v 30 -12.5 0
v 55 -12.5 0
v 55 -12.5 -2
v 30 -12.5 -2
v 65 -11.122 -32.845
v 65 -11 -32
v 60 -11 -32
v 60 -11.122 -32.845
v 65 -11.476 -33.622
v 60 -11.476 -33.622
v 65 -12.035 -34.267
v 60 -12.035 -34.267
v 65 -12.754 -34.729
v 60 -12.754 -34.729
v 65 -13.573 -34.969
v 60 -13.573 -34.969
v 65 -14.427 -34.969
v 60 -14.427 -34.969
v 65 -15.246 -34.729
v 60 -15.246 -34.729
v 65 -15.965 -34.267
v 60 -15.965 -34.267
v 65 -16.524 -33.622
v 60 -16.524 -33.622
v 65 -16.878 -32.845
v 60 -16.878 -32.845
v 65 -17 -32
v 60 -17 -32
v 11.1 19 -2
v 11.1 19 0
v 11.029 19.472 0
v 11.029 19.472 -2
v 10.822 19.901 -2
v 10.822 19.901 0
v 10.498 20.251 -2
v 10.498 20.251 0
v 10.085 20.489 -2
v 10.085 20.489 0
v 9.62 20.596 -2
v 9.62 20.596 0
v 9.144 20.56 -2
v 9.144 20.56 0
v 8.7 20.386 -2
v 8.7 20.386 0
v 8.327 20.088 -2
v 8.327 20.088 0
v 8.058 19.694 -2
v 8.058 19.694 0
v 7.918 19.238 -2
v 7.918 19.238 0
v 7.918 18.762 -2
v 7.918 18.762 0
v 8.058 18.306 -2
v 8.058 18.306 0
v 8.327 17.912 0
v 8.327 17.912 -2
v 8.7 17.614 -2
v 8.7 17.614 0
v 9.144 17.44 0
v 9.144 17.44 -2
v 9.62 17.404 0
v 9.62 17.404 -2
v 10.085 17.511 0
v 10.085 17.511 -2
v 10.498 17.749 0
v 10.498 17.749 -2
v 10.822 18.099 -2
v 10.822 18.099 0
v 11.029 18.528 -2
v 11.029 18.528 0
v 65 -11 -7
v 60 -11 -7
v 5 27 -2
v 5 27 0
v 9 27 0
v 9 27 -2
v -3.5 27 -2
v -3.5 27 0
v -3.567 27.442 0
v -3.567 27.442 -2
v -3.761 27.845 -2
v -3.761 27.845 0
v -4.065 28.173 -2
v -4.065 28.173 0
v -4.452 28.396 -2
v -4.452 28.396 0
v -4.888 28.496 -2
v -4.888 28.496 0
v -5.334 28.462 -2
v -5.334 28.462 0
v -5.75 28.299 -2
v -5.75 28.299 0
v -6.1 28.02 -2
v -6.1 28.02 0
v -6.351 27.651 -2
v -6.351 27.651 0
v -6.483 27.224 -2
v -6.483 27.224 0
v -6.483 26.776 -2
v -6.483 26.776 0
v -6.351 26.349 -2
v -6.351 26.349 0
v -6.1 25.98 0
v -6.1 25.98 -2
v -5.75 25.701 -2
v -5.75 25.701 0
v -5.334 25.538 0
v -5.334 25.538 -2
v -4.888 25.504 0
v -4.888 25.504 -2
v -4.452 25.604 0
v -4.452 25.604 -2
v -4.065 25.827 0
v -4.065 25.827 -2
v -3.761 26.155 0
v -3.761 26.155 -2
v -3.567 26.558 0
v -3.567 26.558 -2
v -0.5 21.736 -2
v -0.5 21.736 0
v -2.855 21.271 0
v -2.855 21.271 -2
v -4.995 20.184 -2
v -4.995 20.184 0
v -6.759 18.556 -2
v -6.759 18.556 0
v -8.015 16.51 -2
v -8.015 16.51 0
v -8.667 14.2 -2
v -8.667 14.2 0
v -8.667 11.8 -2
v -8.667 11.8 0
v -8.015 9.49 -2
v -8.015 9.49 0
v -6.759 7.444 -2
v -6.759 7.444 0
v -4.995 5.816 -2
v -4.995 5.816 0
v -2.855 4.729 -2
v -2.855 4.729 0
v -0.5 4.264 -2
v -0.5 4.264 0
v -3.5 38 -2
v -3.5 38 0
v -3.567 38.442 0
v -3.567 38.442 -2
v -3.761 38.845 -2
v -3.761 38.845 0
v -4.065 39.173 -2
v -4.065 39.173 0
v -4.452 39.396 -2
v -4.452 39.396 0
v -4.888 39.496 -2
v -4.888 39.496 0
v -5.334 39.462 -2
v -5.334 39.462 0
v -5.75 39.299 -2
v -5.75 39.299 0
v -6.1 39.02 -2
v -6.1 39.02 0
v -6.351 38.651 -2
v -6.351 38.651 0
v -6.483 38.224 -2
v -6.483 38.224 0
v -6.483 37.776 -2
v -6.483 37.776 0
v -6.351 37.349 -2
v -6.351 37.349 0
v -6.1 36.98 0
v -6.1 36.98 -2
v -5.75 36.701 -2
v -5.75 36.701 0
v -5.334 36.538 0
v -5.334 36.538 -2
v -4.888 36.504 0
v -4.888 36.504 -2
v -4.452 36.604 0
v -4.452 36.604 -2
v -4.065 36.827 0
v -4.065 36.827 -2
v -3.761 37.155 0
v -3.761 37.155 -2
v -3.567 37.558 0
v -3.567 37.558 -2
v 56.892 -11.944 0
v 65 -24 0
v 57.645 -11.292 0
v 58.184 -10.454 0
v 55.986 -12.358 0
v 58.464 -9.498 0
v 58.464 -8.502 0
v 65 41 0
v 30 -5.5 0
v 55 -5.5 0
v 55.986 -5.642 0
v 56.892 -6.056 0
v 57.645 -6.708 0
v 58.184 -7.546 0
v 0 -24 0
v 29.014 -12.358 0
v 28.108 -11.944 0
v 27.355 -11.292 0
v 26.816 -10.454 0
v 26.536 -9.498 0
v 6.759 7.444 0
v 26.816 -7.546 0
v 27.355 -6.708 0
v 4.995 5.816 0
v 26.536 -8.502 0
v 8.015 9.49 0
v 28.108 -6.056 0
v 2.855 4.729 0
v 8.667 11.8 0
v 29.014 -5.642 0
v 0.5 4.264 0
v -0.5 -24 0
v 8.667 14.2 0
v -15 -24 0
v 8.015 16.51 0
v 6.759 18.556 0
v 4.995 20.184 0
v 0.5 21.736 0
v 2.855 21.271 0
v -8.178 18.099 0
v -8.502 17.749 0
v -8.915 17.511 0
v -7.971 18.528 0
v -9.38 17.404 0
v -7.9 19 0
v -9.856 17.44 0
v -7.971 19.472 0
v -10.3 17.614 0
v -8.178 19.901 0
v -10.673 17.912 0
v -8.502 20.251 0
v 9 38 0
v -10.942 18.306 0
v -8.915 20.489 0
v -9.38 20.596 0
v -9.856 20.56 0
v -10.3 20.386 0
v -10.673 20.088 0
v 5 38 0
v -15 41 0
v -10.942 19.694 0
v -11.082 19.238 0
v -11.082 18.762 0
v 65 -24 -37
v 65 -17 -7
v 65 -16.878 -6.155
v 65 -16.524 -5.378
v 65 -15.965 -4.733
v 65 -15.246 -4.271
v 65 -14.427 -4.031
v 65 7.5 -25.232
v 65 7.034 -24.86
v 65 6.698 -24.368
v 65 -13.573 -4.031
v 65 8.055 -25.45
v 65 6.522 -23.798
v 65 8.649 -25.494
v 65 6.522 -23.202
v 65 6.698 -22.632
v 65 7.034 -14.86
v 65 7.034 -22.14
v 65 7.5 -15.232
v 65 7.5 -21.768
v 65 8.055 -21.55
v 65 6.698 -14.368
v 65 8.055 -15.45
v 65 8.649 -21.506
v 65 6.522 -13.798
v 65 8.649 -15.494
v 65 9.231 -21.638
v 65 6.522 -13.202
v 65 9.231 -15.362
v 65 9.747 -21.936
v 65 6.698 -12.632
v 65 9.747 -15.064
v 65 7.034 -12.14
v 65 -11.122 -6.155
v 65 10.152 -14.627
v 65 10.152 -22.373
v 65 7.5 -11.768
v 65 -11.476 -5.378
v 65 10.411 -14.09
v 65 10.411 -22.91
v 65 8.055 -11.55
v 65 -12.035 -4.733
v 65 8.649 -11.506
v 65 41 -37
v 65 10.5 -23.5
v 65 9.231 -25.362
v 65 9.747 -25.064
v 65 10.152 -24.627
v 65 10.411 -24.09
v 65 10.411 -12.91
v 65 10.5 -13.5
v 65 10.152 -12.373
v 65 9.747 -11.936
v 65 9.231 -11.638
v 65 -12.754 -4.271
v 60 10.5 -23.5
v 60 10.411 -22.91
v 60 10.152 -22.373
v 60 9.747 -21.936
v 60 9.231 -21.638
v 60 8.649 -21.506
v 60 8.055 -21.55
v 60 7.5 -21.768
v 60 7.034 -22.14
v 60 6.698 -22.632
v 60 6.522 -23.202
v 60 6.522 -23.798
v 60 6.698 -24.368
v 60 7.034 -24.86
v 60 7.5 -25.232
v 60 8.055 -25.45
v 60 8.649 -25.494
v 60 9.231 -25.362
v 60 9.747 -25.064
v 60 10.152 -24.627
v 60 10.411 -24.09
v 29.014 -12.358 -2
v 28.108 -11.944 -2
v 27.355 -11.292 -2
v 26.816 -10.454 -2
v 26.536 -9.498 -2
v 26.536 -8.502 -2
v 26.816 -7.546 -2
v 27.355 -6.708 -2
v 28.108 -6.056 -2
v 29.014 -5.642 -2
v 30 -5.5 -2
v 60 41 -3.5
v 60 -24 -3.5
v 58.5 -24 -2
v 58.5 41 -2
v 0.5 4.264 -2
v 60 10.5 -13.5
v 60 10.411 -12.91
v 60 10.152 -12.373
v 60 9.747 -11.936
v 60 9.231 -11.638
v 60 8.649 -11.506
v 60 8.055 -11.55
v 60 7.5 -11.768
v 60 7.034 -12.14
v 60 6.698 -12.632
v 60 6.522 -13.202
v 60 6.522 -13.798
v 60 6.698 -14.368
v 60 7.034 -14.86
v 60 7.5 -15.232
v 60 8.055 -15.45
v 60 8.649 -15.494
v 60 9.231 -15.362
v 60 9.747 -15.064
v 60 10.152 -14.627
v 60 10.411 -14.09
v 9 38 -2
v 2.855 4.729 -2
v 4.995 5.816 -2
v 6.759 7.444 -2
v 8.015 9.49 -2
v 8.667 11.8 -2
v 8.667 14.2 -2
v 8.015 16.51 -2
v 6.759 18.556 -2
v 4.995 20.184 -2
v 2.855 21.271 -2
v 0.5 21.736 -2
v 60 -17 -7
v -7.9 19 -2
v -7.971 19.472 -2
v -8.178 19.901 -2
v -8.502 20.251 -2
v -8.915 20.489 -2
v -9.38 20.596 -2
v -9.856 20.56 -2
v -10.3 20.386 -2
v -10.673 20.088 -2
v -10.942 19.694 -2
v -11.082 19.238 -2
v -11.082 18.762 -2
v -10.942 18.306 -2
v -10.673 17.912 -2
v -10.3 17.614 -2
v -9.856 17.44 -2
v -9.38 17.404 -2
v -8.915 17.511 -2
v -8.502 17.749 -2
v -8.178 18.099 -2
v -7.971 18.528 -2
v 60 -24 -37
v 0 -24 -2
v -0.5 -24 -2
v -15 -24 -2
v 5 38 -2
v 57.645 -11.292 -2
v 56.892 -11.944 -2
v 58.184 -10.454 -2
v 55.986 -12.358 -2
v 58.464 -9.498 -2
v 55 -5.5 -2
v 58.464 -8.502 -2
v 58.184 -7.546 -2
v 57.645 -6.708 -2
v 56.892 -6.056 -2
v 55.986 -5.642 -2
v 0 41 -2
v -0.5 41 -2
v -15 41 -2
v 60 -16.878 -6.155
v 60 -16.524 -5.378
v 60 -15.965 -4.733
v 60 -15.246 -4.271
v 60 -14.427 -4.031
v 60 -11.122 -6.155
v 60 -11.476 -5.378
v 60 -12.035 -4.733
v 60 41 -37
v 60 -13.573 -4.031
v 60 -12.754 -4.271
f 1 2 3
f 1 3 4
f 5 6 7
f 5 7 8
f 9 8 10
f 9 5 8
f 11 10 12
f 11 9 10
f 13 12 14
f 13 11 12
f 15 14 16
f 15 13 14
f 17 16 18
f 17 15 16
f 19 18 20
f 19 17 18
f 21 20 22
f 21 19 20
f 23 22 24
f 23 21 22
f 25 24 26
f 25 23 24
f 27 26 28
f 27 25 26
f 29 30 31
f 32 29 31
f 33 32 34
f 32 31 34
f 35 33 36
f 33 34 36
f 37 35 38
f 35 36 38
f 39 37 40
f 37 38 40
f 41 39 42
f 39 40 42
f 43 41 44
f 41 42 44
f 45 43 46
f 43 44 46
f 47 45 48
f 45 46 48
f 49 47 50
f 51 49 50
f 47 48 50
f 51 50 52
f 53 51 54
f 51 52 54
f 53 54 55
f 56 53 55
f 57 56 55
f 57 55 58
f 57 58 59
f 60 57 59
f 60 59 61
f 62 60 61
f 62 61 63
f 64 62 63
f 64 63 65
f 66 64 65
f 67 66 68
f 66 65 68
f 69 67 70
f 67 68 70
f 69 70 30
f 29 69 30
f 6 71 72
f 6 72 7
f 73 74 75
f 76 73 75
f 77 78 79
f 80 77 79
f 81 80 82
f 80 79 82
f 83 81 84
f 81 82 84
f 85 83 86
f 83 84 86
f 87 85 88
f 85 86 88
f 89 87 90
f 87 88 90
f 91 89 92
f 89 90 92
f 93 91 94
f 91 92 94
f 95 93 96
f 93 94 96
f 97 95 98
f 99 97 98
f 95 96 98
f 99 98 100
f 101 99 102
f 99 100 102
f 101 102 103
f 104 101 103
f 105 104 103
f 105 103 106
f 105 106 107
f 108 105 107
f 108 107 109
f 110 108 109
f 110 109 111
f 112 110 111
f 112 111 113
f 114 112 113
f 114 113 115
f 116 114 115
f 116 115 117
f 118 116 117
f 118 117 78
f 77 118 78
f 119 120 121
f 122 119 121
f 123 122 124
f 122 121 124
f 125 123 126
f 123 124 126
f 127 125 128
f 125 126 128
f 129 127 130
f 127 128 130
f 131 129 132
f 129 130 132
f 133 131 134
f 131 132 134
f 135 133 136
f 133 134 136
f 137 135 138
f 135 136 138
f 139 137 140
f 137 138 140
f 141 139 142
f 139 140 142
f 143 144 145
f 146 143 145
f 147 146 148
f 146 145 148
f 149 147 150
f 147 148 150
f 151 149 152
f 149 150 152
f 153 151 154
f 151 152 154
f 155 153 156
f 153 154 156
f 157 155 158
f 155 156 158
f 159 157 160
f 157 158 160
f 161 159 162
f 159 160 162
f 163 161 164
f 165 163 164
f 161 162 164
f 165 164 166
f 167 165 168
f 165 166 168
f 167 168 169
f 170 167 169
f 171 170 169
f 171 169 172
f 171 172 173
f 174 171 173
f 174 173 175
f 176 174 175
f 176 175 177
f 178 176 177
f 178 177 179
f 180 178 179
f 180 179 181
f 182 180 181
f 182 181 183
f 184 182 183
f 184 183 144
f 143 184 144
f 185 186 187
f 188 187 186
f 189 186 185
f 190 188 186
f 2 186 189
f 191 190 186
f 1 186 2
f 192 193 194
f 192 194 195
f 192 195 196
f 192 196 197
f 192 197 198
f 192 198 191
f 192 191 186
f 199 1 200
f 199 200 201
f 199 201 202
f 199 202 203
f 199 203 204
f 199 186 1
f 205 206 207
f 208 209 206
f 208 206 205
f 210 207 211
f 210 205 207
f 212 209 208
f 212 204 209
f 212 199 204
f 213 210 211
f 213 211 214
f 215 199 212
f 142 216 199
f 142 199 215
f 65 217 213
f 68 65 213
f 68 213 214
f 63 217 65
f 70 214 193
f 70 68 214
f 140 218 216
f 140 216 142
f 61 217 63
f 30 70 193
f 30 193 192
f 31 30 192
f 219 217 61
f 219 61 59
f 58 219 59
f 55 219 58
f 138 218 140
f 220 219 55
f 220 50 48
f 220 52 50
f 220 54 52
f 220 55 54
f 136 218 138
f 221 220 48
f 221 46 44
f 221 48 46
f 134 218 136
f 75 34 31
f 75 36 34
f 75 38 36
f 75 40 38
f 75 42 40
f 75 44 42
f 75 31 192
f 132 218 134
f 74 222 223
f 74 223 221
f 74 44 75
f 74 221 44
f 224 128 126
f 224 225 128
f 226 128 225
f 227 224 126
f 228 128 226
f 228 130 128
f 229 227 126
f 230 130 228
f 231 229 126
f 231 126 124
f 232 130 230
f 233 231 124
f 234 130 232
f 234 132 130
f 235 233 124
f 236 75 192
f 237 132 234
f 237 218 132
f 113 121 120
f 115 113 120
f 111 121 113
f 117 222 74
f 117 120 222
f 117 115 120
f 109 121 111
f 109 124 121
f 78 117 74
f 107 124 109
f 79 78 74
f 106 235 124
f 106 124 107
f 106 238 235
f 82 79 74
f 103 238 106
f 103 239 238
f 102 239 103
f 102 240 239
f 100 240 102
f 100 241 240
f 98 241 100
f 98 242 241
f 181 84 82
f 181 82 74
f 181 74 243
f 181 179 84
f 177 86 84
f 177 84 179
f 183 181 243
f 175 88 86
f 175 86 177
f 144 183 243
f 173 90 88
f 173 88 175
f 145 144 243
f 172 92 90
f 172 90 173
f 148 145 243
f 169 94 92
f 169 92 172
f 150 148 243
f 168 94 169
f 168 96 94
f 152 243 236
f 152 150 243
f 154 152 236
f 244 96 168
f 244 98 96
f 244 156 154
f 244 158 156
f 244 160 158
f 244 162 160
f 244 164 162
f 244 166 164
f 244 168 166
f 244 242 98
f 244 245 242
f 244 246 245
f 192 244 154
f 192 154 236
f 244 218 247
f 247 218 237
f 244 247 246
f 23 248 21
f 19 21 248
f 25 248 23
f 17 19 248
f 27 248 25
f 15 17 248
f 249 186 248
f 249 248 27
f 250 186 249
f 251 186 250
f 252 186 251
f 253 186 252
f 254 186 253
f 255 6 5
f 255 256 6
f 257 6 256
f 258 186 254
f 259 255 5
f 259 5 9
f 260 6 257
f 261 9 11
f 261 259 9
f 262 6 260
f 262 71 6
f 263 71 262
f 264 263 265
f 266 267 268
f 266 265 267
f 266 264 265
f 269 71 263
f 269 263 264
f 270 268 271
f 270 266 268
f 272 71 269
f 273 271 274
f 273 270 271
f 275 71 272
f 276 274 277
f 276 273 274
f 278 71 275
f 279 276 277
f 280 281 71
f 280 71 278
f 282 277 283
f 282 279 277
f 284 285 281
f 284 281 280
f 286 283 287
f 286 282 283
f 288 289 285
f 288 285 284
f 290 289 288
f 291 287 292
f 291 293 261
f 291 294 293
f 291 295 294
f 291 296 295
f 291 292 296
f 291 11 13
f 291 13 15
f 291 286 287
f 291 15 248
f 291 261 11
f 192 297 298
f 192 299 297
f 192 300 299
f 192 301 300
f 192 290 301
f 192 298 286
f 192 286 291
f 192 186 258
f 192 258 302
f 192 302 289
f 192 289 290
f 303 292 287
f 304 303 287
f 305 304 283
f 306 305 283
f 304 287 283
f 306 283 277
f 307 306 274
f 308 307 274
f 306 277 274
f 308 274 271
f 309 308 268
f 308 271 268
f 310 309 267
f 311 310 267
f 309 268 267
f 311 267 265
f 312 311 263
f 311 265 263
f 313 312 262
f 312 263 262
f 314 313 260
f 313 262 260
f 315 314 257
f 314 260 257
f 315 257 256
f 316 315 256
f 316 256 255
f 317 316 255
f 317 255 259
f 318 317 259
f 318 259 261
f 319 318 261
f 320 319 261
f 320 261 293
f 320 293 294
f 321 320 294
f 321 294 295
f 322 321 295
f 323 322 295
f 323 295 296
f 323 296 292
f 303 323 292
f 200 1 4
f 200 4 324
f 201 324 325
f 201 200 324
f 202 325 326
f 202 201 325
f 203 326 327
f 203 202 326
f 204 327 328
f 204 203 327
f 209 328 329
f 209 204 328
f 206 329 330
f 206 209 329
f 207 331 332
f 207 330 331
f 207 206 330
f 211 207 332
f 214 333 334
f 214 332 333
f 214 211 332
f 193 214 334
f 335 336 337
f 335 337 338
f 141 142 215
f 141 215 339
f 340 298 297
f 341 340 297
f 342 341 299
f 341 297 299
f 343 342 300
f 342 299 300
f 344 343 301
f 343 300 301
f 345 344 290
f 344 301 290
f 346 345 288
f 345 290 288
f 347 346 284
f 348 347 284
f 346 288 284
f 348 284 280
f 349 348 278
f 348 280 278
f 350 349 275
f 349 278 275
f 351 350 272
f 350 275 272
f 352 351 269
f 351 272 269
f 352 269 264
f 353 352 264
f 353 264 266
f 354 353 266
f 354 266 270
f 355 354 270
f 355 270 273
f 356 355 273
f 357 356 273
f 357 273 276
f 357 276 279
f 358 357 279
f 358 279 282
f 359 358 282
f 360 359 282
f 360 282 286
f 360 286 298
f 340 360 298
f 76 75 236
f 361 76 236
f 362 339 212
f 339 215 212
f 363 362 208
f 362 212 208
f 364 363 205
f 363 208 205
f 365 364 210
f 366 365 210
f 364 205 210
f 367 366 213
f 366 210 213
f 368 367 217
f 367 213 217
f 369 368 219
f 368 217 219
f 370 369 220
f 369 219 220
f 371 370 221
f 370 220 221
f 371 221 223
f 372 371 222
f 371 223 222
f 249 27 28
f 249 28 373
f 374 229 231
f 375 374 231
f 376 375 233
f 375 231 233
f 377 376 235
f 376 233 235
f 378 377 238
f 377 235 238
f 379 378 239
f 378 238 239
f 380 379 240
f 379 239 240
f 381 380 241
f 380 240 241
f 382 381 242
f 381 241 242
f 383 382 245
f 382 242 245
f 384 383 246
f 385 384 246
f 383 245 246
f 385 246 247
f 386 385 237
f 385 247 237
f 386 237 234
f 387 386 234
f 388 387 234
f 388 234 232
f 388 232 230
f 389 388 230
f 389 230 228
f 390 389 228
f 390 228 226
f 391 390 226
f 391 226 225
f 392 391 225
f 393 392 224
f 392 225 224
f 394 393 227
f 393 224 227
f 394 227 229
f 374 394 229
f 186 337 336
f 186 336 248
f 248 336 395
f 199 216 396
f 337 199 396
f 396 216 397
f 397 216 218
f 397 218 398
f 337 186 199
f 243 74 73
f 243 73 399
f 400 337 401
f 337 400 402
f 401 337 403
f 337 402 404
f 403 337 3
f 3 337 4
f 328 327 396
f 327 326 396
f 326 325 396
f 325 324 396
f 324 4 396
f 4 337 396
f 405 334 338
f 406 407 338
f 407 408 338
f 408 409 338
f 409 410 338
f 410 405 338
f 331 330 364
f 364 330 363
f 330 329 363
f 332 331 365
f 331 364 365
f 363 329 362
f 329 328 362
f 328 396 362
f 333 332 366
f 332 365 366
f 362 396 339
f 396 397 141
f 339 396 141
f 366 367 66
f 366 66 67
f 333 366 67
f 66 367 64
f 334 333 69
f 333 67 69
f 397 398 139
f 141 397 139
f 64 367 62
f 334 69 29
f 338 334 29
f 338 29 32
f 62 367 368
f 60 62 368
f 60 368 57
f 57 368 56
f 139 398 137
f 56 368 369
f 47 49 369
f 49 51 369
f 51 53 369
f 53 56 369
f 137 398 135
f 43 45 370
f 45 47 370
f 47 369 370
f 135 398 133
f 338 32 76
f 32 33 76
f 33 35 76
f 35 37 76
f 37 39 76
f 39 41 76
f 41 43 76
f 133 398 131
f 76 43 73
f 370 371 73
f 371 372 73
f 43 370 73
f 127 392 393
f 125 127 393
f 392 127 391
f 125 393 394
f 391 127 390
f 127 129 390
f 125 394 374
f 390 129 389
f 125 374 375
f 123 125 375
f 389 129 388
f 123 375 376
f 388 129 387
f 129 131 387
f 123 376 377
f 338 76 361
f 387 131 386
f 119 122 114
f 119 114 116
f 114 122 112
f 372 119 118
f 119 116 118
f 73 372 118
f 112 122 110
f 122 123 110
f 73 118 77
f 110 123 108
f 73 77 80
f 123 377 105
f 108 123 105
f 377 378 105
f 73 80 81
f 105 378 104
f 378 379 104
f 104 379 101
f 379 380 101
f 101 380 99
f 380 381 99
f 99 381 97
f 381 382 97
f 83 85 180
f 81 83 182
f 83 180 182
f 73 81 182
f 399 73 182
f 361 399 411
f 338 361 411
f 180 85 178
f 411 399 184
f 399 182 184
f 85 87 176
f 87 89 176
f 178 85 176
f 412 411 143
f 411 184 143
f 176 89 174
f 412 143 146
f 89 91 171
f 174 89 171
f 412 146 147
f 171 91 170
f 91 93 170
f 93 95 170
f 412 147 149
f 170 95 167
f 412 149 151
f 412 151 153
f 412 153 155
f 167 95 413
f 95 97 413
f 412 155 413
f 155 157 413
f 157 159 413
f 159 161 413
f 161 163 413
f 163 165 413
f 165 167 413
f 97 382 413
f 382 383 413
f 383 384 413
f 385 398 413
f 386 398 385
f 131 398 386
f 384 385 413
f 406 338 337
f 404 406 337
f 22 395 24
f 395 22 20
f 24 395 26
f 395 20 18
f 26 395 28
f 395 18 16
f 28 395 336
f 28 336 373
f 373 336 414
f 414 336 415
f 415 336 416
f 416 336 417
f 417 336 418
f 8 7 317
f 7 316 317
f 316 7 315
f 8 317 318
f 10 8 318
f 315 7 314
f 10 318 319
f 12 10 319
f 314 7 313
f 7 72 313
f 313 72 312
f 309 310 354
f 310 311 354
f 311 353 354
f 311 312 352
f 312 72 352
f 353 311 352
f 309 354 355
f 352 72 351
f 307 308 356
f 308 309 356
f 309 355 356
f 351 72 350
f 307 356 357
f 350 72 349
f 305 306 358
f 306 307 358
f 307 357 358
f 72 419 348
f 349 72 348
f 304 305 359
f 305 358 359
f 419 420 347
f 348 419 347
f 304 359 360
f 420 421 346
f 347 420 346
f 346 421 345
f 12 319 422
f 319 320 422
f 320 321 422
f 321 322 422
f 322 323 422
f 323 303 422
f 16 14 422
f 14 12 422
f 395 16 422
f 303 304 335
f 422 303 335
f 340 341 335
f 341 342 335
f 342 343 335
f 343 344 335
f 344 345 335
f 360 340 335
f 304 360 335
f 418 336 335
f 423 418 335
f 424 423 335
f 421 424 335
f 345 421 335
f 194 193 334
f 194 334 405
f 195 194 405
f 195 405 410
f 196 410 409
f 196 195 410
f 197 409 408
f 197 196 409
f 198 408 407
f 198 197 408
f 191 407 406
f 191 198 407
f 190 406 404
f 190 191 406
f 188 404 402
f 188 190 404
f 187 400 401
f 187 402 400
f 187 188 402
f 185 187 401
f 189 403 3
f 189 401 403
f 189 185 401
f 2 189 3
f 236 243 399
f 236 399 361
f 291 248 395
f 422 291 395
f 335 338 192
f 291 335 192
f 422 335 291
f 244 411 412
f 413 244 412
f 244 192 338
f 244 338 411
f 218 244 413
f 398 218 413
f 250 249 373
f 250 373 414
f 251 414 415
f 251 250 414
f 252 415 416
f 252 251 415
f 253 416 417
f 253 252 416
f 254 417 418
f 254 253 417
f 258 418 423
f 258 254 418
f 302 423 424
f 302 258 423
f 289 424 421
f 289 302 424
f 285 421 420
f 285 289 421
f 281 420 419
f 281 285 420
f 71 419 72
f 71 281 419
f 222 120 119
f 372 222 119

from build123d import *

# Parameters (mm, degrees)
SKETCH_1_W           = 30
SKETCH_1_H           = 48
EXTRUDE_1_DEPTH      = 2
SKETCH_2_R           = 1.6
CUT_EXTRUDE_1_DEPTH  = 2
SKETCH_3_R           = 8.75
CUT_EXTRUDE_2_DEPTH  = 2
SKETCH_4_W           = 30
SKETCH_4_H           = 2
EXTRUDE_2_DEPTH      = 17
SKETCH_14_W          = 0.5
SKETCH_14_H          = 2
CUT_EXTRUDE_6_DEPTH  = 67.738294854
SKETCH_15_W          = 2
SKETCH_15_H          = 65
EXTRUDE_7_DEPTH      = 50
SKETCH_16_W          = 5
SKETCH_16_H          = 65
EXTRUDE_8_DEPTH      = 35
SKETCH_17_R          = 2
CUT_EXTRUDE_7_DEPTH  = 35
SKETCH_18_W          = 2
SKETCH_18_H          = 28.264297395
EXTRUDE_9_DEPTH      = 1
EXTRUDE_10_REACH     = 87.675
SKETCH_19_W          = 2
SKETCH_19_H          = 19.264297395
CUT_EXTRUDE_8_DEPTH  = 6
CUT_EXTRUDE_9_DEPTH  = 6
CHAMFER_1_SIZE       = 1.5
SKETCH_22_R          = 1.5
SKETCH_22_W          = 4
SKETCH_22_H          = 11
CUT_EXTRUDE_10_DEPTH = 86.293610546


with BuildPart() as part:
    # 草图1 → 凸台-拉伸1 (new body)
    with BuildSketch(Plane.XY):
        Rectangle(SKETCH_1_W, SKETCH_1_H)
    extrude(amount=-EXTRUDE_1_DEPTH)

    # 草图2 → 切除-拉伸1 (cut)
    with BuildSketch(Plane.XY):
        with Locations((-9.5, 19)):
            Circle(SKETCH_2_R)
        with Locations((9.5, 19)):
            Circle(SKETCH_2_R)
    extrude(amount=-CUT_EXTRUDE_1_DEPTH, mode=Mode.SUBTRACT)

    # 草图3 → 切除-拉伸2 (cut)
    with BuildSketch(Plane.XY):
        with Locations((0, 13)):
            Circle(SKETCH_3_R)
    extrude(amount=-CUT_EXTRUDE_2_DEPTH, mode=Mode.SUBTRACT)

    # 草图4 → 凸台-拉伸2 (add)
    with BuildSketch(Plane(origin=(0, 24, 0), x_dir=(1, 0, 0), z_dir=(0, 1, 0))):
        with Locations((0, 1)):
            Rectangle(SKETCH_4_W, SKETCH_4_H)
    extrude(amount=EXTRUDE_2_DEPTH)

    # 草图14 → 切除-拉伸6 (cut, through all)
    with BuildSketch(Plane.XZ.offset(24)):
        with Locations((-0.25, -1)):
            Rectangle(SKETCH_14_W, SKETCH_14_H)
    extrude(amount=-CUT_EXTRUDE_6_DEPTH, mode=Mode.SUBTRACT)


with BuildPart() as cut_extrude_6_piece_1:
    # of the separate pieces the step leaves, piece 1, a body of its own (cut_extrude_6_pieces)
    add(part.part.solids().sort_by_distance((15, -24, 0))[0])

    # 草图15 → 凸台-拉伸7 (add)
    with BuildSketch(Plane(origin=(15, 0, 0), x_dir=(0, 0, -1), z_dir=(1, 0, 0))):
        with Locations((1, 8.5)):
            Rectangle(SKETCH_15_W, SKETCH_15_H)
    extrude(amount=EXTRUDE_7_DEPTH)

    # 草图16 → 凸台-拉伸8 (add)
    with BuildSketch(Plane(origin=(0, 0, -2), x_dir=(-1, 0, 0), z_dir=(0, 0, -1))):
        with Locations((-62.5, 8.5)):
            Rectangle(SKETCH_16_W, SKETCH_16_H)
    extrude(amount=EXTRUDE_8_DEPTH)

    # 草图17 → 切除-拉伸7 (cut)
    with BuildSketch(Plane(origin=(65, 0, 0), x_dir=(0, 0, -1), z_dir=(1, 0, 0))):
        with Locations(Location((13.5, 8.5, 0), (0, 0, 90))):
            Circle(SKETCH_17_R)
        with Locations(Location((23.5, 8.5, 0), (0, 0, 90))):
            Circle(SKETCH_17_R)
    extrude(amount=-CUT_EXTRUDE_7_DEPTH, mode=Mode.SUBTRACT)



with BuildPart() as cut_extrude_6_piece_2:
    # of the separate pieces the step leaves, piece 2, a body of its own (cut_extrude_6_pieces)
    add(part.part.solids().sort_by_distance((-15, -24, 0))[0])


with BuildPart() as cut_extrude_6_piece_1_1:
    add(cut_extrude_6_piece_1.part)

    add(cut_extrude_6_piece_2.part)  # 凸台-拉伸9 merges 切除-拉伸6 piece 2
    # 草图18 → 凸台-拉伸9 (add)
    with BuildSketch(Plane(origin=(-0.5, 0, 0), x_dir=(0, 0, -1), z_dir=(1, 0, 0))):
        with Locations((1, -9.867851303)):
            Rectangle(SKETCH_18_W, SKETCH_18_H)
    extrude(amount=EXTRUDE_9_DEPTH)

    # 草图19 → 凸台-拉伸10 (add, up to next)
    with BuildSketch(Plane(origin=(-0.5, 0, 0), x_dir=(0, 0, -1), z_dir=(1, 0, 0)), mode=Mode.PRIVATE) as extrude_10_sk1:
        with Locations((1, 31.367851303)):
            Rectangle(SKETCH_19_W, SKETCH_19_H)
    extrude_10_tool1 = extrude(extrude_10_sk1.sketch, amount=EXTRUDE_10_REACH, mode=Mode.PRIVATE) - cut_extrude_6_piece_1_1.part
    add(extrude_10_tool1.solids().sort_by_distance((-0.5, 31.367851, -1))[0])

    # 草图20 → 切除-拉伸8 (cut)
    with BuildSketch(Plane.XY):
        with BuildLine():
            Line((30, -5.5), (55, -5.5))
            ThreePointArc((55, -5.5), (58.5, -9), (55, -12.5))
            Line((55, -12.5), (30, -12.5))
            ThreePointArc((30, -12.5), (26.5, -9), (30, -5.5))
        make_face()
    extrude(amount=-CUT_EXTRUDE_8_DEPTH, mode=Mode.SUBTRACT)

    # 草图21 → 切除-拉伸9 (cut)
    with BuildSketch(Plane(origin=(65, 0, 0), x_dir=(0, 0, -1), z_dir=(1, 0, 0))):
        with BuildLine():
            Line((7, -11), (32, -11))
            ThreePointArc((32, -11), (35, -14), (32, -17))
            Line((32, -17), (7, -17))
            ThreePointArc((7, -17), (4, -14), (7, -11))
        make_face()
    extrude(amount=-CUT_EXTRUDE_9_DEPTH, mode=Mode.SUBTRACT)

    # 倒角1
    chamfer_1_edges = [cut_extrude_6_piece_1_1.edges().sort_by_distance(p)[0] for p in [
        (60, 8.5, -2),
    ]]
    chamfer(chamfer_1_edges, length=CHAMFER_1_SIZE - 0.0001)  # a hair under: the kernel refuses the full size

    # 草图22 → 切除-拉伸10 (cut, through all)
    with BuildSketch(Plane.XY):
        with Locations((-5, 38)):
            Circle(SKETCH_22_R)
        with Locations((-5, 27)):
            Circle(SKETCH_22_R)
        with Locations((7, 32.5)):
            Rectangle(SKETCH_22_W, SKETCH_22_H)
    extrude(amount=-CUT_EXTRUDE_10_DEPTH, mode=Mode.SUBTRACT)


solid = cut_extrude_6_piece_1_1.part
